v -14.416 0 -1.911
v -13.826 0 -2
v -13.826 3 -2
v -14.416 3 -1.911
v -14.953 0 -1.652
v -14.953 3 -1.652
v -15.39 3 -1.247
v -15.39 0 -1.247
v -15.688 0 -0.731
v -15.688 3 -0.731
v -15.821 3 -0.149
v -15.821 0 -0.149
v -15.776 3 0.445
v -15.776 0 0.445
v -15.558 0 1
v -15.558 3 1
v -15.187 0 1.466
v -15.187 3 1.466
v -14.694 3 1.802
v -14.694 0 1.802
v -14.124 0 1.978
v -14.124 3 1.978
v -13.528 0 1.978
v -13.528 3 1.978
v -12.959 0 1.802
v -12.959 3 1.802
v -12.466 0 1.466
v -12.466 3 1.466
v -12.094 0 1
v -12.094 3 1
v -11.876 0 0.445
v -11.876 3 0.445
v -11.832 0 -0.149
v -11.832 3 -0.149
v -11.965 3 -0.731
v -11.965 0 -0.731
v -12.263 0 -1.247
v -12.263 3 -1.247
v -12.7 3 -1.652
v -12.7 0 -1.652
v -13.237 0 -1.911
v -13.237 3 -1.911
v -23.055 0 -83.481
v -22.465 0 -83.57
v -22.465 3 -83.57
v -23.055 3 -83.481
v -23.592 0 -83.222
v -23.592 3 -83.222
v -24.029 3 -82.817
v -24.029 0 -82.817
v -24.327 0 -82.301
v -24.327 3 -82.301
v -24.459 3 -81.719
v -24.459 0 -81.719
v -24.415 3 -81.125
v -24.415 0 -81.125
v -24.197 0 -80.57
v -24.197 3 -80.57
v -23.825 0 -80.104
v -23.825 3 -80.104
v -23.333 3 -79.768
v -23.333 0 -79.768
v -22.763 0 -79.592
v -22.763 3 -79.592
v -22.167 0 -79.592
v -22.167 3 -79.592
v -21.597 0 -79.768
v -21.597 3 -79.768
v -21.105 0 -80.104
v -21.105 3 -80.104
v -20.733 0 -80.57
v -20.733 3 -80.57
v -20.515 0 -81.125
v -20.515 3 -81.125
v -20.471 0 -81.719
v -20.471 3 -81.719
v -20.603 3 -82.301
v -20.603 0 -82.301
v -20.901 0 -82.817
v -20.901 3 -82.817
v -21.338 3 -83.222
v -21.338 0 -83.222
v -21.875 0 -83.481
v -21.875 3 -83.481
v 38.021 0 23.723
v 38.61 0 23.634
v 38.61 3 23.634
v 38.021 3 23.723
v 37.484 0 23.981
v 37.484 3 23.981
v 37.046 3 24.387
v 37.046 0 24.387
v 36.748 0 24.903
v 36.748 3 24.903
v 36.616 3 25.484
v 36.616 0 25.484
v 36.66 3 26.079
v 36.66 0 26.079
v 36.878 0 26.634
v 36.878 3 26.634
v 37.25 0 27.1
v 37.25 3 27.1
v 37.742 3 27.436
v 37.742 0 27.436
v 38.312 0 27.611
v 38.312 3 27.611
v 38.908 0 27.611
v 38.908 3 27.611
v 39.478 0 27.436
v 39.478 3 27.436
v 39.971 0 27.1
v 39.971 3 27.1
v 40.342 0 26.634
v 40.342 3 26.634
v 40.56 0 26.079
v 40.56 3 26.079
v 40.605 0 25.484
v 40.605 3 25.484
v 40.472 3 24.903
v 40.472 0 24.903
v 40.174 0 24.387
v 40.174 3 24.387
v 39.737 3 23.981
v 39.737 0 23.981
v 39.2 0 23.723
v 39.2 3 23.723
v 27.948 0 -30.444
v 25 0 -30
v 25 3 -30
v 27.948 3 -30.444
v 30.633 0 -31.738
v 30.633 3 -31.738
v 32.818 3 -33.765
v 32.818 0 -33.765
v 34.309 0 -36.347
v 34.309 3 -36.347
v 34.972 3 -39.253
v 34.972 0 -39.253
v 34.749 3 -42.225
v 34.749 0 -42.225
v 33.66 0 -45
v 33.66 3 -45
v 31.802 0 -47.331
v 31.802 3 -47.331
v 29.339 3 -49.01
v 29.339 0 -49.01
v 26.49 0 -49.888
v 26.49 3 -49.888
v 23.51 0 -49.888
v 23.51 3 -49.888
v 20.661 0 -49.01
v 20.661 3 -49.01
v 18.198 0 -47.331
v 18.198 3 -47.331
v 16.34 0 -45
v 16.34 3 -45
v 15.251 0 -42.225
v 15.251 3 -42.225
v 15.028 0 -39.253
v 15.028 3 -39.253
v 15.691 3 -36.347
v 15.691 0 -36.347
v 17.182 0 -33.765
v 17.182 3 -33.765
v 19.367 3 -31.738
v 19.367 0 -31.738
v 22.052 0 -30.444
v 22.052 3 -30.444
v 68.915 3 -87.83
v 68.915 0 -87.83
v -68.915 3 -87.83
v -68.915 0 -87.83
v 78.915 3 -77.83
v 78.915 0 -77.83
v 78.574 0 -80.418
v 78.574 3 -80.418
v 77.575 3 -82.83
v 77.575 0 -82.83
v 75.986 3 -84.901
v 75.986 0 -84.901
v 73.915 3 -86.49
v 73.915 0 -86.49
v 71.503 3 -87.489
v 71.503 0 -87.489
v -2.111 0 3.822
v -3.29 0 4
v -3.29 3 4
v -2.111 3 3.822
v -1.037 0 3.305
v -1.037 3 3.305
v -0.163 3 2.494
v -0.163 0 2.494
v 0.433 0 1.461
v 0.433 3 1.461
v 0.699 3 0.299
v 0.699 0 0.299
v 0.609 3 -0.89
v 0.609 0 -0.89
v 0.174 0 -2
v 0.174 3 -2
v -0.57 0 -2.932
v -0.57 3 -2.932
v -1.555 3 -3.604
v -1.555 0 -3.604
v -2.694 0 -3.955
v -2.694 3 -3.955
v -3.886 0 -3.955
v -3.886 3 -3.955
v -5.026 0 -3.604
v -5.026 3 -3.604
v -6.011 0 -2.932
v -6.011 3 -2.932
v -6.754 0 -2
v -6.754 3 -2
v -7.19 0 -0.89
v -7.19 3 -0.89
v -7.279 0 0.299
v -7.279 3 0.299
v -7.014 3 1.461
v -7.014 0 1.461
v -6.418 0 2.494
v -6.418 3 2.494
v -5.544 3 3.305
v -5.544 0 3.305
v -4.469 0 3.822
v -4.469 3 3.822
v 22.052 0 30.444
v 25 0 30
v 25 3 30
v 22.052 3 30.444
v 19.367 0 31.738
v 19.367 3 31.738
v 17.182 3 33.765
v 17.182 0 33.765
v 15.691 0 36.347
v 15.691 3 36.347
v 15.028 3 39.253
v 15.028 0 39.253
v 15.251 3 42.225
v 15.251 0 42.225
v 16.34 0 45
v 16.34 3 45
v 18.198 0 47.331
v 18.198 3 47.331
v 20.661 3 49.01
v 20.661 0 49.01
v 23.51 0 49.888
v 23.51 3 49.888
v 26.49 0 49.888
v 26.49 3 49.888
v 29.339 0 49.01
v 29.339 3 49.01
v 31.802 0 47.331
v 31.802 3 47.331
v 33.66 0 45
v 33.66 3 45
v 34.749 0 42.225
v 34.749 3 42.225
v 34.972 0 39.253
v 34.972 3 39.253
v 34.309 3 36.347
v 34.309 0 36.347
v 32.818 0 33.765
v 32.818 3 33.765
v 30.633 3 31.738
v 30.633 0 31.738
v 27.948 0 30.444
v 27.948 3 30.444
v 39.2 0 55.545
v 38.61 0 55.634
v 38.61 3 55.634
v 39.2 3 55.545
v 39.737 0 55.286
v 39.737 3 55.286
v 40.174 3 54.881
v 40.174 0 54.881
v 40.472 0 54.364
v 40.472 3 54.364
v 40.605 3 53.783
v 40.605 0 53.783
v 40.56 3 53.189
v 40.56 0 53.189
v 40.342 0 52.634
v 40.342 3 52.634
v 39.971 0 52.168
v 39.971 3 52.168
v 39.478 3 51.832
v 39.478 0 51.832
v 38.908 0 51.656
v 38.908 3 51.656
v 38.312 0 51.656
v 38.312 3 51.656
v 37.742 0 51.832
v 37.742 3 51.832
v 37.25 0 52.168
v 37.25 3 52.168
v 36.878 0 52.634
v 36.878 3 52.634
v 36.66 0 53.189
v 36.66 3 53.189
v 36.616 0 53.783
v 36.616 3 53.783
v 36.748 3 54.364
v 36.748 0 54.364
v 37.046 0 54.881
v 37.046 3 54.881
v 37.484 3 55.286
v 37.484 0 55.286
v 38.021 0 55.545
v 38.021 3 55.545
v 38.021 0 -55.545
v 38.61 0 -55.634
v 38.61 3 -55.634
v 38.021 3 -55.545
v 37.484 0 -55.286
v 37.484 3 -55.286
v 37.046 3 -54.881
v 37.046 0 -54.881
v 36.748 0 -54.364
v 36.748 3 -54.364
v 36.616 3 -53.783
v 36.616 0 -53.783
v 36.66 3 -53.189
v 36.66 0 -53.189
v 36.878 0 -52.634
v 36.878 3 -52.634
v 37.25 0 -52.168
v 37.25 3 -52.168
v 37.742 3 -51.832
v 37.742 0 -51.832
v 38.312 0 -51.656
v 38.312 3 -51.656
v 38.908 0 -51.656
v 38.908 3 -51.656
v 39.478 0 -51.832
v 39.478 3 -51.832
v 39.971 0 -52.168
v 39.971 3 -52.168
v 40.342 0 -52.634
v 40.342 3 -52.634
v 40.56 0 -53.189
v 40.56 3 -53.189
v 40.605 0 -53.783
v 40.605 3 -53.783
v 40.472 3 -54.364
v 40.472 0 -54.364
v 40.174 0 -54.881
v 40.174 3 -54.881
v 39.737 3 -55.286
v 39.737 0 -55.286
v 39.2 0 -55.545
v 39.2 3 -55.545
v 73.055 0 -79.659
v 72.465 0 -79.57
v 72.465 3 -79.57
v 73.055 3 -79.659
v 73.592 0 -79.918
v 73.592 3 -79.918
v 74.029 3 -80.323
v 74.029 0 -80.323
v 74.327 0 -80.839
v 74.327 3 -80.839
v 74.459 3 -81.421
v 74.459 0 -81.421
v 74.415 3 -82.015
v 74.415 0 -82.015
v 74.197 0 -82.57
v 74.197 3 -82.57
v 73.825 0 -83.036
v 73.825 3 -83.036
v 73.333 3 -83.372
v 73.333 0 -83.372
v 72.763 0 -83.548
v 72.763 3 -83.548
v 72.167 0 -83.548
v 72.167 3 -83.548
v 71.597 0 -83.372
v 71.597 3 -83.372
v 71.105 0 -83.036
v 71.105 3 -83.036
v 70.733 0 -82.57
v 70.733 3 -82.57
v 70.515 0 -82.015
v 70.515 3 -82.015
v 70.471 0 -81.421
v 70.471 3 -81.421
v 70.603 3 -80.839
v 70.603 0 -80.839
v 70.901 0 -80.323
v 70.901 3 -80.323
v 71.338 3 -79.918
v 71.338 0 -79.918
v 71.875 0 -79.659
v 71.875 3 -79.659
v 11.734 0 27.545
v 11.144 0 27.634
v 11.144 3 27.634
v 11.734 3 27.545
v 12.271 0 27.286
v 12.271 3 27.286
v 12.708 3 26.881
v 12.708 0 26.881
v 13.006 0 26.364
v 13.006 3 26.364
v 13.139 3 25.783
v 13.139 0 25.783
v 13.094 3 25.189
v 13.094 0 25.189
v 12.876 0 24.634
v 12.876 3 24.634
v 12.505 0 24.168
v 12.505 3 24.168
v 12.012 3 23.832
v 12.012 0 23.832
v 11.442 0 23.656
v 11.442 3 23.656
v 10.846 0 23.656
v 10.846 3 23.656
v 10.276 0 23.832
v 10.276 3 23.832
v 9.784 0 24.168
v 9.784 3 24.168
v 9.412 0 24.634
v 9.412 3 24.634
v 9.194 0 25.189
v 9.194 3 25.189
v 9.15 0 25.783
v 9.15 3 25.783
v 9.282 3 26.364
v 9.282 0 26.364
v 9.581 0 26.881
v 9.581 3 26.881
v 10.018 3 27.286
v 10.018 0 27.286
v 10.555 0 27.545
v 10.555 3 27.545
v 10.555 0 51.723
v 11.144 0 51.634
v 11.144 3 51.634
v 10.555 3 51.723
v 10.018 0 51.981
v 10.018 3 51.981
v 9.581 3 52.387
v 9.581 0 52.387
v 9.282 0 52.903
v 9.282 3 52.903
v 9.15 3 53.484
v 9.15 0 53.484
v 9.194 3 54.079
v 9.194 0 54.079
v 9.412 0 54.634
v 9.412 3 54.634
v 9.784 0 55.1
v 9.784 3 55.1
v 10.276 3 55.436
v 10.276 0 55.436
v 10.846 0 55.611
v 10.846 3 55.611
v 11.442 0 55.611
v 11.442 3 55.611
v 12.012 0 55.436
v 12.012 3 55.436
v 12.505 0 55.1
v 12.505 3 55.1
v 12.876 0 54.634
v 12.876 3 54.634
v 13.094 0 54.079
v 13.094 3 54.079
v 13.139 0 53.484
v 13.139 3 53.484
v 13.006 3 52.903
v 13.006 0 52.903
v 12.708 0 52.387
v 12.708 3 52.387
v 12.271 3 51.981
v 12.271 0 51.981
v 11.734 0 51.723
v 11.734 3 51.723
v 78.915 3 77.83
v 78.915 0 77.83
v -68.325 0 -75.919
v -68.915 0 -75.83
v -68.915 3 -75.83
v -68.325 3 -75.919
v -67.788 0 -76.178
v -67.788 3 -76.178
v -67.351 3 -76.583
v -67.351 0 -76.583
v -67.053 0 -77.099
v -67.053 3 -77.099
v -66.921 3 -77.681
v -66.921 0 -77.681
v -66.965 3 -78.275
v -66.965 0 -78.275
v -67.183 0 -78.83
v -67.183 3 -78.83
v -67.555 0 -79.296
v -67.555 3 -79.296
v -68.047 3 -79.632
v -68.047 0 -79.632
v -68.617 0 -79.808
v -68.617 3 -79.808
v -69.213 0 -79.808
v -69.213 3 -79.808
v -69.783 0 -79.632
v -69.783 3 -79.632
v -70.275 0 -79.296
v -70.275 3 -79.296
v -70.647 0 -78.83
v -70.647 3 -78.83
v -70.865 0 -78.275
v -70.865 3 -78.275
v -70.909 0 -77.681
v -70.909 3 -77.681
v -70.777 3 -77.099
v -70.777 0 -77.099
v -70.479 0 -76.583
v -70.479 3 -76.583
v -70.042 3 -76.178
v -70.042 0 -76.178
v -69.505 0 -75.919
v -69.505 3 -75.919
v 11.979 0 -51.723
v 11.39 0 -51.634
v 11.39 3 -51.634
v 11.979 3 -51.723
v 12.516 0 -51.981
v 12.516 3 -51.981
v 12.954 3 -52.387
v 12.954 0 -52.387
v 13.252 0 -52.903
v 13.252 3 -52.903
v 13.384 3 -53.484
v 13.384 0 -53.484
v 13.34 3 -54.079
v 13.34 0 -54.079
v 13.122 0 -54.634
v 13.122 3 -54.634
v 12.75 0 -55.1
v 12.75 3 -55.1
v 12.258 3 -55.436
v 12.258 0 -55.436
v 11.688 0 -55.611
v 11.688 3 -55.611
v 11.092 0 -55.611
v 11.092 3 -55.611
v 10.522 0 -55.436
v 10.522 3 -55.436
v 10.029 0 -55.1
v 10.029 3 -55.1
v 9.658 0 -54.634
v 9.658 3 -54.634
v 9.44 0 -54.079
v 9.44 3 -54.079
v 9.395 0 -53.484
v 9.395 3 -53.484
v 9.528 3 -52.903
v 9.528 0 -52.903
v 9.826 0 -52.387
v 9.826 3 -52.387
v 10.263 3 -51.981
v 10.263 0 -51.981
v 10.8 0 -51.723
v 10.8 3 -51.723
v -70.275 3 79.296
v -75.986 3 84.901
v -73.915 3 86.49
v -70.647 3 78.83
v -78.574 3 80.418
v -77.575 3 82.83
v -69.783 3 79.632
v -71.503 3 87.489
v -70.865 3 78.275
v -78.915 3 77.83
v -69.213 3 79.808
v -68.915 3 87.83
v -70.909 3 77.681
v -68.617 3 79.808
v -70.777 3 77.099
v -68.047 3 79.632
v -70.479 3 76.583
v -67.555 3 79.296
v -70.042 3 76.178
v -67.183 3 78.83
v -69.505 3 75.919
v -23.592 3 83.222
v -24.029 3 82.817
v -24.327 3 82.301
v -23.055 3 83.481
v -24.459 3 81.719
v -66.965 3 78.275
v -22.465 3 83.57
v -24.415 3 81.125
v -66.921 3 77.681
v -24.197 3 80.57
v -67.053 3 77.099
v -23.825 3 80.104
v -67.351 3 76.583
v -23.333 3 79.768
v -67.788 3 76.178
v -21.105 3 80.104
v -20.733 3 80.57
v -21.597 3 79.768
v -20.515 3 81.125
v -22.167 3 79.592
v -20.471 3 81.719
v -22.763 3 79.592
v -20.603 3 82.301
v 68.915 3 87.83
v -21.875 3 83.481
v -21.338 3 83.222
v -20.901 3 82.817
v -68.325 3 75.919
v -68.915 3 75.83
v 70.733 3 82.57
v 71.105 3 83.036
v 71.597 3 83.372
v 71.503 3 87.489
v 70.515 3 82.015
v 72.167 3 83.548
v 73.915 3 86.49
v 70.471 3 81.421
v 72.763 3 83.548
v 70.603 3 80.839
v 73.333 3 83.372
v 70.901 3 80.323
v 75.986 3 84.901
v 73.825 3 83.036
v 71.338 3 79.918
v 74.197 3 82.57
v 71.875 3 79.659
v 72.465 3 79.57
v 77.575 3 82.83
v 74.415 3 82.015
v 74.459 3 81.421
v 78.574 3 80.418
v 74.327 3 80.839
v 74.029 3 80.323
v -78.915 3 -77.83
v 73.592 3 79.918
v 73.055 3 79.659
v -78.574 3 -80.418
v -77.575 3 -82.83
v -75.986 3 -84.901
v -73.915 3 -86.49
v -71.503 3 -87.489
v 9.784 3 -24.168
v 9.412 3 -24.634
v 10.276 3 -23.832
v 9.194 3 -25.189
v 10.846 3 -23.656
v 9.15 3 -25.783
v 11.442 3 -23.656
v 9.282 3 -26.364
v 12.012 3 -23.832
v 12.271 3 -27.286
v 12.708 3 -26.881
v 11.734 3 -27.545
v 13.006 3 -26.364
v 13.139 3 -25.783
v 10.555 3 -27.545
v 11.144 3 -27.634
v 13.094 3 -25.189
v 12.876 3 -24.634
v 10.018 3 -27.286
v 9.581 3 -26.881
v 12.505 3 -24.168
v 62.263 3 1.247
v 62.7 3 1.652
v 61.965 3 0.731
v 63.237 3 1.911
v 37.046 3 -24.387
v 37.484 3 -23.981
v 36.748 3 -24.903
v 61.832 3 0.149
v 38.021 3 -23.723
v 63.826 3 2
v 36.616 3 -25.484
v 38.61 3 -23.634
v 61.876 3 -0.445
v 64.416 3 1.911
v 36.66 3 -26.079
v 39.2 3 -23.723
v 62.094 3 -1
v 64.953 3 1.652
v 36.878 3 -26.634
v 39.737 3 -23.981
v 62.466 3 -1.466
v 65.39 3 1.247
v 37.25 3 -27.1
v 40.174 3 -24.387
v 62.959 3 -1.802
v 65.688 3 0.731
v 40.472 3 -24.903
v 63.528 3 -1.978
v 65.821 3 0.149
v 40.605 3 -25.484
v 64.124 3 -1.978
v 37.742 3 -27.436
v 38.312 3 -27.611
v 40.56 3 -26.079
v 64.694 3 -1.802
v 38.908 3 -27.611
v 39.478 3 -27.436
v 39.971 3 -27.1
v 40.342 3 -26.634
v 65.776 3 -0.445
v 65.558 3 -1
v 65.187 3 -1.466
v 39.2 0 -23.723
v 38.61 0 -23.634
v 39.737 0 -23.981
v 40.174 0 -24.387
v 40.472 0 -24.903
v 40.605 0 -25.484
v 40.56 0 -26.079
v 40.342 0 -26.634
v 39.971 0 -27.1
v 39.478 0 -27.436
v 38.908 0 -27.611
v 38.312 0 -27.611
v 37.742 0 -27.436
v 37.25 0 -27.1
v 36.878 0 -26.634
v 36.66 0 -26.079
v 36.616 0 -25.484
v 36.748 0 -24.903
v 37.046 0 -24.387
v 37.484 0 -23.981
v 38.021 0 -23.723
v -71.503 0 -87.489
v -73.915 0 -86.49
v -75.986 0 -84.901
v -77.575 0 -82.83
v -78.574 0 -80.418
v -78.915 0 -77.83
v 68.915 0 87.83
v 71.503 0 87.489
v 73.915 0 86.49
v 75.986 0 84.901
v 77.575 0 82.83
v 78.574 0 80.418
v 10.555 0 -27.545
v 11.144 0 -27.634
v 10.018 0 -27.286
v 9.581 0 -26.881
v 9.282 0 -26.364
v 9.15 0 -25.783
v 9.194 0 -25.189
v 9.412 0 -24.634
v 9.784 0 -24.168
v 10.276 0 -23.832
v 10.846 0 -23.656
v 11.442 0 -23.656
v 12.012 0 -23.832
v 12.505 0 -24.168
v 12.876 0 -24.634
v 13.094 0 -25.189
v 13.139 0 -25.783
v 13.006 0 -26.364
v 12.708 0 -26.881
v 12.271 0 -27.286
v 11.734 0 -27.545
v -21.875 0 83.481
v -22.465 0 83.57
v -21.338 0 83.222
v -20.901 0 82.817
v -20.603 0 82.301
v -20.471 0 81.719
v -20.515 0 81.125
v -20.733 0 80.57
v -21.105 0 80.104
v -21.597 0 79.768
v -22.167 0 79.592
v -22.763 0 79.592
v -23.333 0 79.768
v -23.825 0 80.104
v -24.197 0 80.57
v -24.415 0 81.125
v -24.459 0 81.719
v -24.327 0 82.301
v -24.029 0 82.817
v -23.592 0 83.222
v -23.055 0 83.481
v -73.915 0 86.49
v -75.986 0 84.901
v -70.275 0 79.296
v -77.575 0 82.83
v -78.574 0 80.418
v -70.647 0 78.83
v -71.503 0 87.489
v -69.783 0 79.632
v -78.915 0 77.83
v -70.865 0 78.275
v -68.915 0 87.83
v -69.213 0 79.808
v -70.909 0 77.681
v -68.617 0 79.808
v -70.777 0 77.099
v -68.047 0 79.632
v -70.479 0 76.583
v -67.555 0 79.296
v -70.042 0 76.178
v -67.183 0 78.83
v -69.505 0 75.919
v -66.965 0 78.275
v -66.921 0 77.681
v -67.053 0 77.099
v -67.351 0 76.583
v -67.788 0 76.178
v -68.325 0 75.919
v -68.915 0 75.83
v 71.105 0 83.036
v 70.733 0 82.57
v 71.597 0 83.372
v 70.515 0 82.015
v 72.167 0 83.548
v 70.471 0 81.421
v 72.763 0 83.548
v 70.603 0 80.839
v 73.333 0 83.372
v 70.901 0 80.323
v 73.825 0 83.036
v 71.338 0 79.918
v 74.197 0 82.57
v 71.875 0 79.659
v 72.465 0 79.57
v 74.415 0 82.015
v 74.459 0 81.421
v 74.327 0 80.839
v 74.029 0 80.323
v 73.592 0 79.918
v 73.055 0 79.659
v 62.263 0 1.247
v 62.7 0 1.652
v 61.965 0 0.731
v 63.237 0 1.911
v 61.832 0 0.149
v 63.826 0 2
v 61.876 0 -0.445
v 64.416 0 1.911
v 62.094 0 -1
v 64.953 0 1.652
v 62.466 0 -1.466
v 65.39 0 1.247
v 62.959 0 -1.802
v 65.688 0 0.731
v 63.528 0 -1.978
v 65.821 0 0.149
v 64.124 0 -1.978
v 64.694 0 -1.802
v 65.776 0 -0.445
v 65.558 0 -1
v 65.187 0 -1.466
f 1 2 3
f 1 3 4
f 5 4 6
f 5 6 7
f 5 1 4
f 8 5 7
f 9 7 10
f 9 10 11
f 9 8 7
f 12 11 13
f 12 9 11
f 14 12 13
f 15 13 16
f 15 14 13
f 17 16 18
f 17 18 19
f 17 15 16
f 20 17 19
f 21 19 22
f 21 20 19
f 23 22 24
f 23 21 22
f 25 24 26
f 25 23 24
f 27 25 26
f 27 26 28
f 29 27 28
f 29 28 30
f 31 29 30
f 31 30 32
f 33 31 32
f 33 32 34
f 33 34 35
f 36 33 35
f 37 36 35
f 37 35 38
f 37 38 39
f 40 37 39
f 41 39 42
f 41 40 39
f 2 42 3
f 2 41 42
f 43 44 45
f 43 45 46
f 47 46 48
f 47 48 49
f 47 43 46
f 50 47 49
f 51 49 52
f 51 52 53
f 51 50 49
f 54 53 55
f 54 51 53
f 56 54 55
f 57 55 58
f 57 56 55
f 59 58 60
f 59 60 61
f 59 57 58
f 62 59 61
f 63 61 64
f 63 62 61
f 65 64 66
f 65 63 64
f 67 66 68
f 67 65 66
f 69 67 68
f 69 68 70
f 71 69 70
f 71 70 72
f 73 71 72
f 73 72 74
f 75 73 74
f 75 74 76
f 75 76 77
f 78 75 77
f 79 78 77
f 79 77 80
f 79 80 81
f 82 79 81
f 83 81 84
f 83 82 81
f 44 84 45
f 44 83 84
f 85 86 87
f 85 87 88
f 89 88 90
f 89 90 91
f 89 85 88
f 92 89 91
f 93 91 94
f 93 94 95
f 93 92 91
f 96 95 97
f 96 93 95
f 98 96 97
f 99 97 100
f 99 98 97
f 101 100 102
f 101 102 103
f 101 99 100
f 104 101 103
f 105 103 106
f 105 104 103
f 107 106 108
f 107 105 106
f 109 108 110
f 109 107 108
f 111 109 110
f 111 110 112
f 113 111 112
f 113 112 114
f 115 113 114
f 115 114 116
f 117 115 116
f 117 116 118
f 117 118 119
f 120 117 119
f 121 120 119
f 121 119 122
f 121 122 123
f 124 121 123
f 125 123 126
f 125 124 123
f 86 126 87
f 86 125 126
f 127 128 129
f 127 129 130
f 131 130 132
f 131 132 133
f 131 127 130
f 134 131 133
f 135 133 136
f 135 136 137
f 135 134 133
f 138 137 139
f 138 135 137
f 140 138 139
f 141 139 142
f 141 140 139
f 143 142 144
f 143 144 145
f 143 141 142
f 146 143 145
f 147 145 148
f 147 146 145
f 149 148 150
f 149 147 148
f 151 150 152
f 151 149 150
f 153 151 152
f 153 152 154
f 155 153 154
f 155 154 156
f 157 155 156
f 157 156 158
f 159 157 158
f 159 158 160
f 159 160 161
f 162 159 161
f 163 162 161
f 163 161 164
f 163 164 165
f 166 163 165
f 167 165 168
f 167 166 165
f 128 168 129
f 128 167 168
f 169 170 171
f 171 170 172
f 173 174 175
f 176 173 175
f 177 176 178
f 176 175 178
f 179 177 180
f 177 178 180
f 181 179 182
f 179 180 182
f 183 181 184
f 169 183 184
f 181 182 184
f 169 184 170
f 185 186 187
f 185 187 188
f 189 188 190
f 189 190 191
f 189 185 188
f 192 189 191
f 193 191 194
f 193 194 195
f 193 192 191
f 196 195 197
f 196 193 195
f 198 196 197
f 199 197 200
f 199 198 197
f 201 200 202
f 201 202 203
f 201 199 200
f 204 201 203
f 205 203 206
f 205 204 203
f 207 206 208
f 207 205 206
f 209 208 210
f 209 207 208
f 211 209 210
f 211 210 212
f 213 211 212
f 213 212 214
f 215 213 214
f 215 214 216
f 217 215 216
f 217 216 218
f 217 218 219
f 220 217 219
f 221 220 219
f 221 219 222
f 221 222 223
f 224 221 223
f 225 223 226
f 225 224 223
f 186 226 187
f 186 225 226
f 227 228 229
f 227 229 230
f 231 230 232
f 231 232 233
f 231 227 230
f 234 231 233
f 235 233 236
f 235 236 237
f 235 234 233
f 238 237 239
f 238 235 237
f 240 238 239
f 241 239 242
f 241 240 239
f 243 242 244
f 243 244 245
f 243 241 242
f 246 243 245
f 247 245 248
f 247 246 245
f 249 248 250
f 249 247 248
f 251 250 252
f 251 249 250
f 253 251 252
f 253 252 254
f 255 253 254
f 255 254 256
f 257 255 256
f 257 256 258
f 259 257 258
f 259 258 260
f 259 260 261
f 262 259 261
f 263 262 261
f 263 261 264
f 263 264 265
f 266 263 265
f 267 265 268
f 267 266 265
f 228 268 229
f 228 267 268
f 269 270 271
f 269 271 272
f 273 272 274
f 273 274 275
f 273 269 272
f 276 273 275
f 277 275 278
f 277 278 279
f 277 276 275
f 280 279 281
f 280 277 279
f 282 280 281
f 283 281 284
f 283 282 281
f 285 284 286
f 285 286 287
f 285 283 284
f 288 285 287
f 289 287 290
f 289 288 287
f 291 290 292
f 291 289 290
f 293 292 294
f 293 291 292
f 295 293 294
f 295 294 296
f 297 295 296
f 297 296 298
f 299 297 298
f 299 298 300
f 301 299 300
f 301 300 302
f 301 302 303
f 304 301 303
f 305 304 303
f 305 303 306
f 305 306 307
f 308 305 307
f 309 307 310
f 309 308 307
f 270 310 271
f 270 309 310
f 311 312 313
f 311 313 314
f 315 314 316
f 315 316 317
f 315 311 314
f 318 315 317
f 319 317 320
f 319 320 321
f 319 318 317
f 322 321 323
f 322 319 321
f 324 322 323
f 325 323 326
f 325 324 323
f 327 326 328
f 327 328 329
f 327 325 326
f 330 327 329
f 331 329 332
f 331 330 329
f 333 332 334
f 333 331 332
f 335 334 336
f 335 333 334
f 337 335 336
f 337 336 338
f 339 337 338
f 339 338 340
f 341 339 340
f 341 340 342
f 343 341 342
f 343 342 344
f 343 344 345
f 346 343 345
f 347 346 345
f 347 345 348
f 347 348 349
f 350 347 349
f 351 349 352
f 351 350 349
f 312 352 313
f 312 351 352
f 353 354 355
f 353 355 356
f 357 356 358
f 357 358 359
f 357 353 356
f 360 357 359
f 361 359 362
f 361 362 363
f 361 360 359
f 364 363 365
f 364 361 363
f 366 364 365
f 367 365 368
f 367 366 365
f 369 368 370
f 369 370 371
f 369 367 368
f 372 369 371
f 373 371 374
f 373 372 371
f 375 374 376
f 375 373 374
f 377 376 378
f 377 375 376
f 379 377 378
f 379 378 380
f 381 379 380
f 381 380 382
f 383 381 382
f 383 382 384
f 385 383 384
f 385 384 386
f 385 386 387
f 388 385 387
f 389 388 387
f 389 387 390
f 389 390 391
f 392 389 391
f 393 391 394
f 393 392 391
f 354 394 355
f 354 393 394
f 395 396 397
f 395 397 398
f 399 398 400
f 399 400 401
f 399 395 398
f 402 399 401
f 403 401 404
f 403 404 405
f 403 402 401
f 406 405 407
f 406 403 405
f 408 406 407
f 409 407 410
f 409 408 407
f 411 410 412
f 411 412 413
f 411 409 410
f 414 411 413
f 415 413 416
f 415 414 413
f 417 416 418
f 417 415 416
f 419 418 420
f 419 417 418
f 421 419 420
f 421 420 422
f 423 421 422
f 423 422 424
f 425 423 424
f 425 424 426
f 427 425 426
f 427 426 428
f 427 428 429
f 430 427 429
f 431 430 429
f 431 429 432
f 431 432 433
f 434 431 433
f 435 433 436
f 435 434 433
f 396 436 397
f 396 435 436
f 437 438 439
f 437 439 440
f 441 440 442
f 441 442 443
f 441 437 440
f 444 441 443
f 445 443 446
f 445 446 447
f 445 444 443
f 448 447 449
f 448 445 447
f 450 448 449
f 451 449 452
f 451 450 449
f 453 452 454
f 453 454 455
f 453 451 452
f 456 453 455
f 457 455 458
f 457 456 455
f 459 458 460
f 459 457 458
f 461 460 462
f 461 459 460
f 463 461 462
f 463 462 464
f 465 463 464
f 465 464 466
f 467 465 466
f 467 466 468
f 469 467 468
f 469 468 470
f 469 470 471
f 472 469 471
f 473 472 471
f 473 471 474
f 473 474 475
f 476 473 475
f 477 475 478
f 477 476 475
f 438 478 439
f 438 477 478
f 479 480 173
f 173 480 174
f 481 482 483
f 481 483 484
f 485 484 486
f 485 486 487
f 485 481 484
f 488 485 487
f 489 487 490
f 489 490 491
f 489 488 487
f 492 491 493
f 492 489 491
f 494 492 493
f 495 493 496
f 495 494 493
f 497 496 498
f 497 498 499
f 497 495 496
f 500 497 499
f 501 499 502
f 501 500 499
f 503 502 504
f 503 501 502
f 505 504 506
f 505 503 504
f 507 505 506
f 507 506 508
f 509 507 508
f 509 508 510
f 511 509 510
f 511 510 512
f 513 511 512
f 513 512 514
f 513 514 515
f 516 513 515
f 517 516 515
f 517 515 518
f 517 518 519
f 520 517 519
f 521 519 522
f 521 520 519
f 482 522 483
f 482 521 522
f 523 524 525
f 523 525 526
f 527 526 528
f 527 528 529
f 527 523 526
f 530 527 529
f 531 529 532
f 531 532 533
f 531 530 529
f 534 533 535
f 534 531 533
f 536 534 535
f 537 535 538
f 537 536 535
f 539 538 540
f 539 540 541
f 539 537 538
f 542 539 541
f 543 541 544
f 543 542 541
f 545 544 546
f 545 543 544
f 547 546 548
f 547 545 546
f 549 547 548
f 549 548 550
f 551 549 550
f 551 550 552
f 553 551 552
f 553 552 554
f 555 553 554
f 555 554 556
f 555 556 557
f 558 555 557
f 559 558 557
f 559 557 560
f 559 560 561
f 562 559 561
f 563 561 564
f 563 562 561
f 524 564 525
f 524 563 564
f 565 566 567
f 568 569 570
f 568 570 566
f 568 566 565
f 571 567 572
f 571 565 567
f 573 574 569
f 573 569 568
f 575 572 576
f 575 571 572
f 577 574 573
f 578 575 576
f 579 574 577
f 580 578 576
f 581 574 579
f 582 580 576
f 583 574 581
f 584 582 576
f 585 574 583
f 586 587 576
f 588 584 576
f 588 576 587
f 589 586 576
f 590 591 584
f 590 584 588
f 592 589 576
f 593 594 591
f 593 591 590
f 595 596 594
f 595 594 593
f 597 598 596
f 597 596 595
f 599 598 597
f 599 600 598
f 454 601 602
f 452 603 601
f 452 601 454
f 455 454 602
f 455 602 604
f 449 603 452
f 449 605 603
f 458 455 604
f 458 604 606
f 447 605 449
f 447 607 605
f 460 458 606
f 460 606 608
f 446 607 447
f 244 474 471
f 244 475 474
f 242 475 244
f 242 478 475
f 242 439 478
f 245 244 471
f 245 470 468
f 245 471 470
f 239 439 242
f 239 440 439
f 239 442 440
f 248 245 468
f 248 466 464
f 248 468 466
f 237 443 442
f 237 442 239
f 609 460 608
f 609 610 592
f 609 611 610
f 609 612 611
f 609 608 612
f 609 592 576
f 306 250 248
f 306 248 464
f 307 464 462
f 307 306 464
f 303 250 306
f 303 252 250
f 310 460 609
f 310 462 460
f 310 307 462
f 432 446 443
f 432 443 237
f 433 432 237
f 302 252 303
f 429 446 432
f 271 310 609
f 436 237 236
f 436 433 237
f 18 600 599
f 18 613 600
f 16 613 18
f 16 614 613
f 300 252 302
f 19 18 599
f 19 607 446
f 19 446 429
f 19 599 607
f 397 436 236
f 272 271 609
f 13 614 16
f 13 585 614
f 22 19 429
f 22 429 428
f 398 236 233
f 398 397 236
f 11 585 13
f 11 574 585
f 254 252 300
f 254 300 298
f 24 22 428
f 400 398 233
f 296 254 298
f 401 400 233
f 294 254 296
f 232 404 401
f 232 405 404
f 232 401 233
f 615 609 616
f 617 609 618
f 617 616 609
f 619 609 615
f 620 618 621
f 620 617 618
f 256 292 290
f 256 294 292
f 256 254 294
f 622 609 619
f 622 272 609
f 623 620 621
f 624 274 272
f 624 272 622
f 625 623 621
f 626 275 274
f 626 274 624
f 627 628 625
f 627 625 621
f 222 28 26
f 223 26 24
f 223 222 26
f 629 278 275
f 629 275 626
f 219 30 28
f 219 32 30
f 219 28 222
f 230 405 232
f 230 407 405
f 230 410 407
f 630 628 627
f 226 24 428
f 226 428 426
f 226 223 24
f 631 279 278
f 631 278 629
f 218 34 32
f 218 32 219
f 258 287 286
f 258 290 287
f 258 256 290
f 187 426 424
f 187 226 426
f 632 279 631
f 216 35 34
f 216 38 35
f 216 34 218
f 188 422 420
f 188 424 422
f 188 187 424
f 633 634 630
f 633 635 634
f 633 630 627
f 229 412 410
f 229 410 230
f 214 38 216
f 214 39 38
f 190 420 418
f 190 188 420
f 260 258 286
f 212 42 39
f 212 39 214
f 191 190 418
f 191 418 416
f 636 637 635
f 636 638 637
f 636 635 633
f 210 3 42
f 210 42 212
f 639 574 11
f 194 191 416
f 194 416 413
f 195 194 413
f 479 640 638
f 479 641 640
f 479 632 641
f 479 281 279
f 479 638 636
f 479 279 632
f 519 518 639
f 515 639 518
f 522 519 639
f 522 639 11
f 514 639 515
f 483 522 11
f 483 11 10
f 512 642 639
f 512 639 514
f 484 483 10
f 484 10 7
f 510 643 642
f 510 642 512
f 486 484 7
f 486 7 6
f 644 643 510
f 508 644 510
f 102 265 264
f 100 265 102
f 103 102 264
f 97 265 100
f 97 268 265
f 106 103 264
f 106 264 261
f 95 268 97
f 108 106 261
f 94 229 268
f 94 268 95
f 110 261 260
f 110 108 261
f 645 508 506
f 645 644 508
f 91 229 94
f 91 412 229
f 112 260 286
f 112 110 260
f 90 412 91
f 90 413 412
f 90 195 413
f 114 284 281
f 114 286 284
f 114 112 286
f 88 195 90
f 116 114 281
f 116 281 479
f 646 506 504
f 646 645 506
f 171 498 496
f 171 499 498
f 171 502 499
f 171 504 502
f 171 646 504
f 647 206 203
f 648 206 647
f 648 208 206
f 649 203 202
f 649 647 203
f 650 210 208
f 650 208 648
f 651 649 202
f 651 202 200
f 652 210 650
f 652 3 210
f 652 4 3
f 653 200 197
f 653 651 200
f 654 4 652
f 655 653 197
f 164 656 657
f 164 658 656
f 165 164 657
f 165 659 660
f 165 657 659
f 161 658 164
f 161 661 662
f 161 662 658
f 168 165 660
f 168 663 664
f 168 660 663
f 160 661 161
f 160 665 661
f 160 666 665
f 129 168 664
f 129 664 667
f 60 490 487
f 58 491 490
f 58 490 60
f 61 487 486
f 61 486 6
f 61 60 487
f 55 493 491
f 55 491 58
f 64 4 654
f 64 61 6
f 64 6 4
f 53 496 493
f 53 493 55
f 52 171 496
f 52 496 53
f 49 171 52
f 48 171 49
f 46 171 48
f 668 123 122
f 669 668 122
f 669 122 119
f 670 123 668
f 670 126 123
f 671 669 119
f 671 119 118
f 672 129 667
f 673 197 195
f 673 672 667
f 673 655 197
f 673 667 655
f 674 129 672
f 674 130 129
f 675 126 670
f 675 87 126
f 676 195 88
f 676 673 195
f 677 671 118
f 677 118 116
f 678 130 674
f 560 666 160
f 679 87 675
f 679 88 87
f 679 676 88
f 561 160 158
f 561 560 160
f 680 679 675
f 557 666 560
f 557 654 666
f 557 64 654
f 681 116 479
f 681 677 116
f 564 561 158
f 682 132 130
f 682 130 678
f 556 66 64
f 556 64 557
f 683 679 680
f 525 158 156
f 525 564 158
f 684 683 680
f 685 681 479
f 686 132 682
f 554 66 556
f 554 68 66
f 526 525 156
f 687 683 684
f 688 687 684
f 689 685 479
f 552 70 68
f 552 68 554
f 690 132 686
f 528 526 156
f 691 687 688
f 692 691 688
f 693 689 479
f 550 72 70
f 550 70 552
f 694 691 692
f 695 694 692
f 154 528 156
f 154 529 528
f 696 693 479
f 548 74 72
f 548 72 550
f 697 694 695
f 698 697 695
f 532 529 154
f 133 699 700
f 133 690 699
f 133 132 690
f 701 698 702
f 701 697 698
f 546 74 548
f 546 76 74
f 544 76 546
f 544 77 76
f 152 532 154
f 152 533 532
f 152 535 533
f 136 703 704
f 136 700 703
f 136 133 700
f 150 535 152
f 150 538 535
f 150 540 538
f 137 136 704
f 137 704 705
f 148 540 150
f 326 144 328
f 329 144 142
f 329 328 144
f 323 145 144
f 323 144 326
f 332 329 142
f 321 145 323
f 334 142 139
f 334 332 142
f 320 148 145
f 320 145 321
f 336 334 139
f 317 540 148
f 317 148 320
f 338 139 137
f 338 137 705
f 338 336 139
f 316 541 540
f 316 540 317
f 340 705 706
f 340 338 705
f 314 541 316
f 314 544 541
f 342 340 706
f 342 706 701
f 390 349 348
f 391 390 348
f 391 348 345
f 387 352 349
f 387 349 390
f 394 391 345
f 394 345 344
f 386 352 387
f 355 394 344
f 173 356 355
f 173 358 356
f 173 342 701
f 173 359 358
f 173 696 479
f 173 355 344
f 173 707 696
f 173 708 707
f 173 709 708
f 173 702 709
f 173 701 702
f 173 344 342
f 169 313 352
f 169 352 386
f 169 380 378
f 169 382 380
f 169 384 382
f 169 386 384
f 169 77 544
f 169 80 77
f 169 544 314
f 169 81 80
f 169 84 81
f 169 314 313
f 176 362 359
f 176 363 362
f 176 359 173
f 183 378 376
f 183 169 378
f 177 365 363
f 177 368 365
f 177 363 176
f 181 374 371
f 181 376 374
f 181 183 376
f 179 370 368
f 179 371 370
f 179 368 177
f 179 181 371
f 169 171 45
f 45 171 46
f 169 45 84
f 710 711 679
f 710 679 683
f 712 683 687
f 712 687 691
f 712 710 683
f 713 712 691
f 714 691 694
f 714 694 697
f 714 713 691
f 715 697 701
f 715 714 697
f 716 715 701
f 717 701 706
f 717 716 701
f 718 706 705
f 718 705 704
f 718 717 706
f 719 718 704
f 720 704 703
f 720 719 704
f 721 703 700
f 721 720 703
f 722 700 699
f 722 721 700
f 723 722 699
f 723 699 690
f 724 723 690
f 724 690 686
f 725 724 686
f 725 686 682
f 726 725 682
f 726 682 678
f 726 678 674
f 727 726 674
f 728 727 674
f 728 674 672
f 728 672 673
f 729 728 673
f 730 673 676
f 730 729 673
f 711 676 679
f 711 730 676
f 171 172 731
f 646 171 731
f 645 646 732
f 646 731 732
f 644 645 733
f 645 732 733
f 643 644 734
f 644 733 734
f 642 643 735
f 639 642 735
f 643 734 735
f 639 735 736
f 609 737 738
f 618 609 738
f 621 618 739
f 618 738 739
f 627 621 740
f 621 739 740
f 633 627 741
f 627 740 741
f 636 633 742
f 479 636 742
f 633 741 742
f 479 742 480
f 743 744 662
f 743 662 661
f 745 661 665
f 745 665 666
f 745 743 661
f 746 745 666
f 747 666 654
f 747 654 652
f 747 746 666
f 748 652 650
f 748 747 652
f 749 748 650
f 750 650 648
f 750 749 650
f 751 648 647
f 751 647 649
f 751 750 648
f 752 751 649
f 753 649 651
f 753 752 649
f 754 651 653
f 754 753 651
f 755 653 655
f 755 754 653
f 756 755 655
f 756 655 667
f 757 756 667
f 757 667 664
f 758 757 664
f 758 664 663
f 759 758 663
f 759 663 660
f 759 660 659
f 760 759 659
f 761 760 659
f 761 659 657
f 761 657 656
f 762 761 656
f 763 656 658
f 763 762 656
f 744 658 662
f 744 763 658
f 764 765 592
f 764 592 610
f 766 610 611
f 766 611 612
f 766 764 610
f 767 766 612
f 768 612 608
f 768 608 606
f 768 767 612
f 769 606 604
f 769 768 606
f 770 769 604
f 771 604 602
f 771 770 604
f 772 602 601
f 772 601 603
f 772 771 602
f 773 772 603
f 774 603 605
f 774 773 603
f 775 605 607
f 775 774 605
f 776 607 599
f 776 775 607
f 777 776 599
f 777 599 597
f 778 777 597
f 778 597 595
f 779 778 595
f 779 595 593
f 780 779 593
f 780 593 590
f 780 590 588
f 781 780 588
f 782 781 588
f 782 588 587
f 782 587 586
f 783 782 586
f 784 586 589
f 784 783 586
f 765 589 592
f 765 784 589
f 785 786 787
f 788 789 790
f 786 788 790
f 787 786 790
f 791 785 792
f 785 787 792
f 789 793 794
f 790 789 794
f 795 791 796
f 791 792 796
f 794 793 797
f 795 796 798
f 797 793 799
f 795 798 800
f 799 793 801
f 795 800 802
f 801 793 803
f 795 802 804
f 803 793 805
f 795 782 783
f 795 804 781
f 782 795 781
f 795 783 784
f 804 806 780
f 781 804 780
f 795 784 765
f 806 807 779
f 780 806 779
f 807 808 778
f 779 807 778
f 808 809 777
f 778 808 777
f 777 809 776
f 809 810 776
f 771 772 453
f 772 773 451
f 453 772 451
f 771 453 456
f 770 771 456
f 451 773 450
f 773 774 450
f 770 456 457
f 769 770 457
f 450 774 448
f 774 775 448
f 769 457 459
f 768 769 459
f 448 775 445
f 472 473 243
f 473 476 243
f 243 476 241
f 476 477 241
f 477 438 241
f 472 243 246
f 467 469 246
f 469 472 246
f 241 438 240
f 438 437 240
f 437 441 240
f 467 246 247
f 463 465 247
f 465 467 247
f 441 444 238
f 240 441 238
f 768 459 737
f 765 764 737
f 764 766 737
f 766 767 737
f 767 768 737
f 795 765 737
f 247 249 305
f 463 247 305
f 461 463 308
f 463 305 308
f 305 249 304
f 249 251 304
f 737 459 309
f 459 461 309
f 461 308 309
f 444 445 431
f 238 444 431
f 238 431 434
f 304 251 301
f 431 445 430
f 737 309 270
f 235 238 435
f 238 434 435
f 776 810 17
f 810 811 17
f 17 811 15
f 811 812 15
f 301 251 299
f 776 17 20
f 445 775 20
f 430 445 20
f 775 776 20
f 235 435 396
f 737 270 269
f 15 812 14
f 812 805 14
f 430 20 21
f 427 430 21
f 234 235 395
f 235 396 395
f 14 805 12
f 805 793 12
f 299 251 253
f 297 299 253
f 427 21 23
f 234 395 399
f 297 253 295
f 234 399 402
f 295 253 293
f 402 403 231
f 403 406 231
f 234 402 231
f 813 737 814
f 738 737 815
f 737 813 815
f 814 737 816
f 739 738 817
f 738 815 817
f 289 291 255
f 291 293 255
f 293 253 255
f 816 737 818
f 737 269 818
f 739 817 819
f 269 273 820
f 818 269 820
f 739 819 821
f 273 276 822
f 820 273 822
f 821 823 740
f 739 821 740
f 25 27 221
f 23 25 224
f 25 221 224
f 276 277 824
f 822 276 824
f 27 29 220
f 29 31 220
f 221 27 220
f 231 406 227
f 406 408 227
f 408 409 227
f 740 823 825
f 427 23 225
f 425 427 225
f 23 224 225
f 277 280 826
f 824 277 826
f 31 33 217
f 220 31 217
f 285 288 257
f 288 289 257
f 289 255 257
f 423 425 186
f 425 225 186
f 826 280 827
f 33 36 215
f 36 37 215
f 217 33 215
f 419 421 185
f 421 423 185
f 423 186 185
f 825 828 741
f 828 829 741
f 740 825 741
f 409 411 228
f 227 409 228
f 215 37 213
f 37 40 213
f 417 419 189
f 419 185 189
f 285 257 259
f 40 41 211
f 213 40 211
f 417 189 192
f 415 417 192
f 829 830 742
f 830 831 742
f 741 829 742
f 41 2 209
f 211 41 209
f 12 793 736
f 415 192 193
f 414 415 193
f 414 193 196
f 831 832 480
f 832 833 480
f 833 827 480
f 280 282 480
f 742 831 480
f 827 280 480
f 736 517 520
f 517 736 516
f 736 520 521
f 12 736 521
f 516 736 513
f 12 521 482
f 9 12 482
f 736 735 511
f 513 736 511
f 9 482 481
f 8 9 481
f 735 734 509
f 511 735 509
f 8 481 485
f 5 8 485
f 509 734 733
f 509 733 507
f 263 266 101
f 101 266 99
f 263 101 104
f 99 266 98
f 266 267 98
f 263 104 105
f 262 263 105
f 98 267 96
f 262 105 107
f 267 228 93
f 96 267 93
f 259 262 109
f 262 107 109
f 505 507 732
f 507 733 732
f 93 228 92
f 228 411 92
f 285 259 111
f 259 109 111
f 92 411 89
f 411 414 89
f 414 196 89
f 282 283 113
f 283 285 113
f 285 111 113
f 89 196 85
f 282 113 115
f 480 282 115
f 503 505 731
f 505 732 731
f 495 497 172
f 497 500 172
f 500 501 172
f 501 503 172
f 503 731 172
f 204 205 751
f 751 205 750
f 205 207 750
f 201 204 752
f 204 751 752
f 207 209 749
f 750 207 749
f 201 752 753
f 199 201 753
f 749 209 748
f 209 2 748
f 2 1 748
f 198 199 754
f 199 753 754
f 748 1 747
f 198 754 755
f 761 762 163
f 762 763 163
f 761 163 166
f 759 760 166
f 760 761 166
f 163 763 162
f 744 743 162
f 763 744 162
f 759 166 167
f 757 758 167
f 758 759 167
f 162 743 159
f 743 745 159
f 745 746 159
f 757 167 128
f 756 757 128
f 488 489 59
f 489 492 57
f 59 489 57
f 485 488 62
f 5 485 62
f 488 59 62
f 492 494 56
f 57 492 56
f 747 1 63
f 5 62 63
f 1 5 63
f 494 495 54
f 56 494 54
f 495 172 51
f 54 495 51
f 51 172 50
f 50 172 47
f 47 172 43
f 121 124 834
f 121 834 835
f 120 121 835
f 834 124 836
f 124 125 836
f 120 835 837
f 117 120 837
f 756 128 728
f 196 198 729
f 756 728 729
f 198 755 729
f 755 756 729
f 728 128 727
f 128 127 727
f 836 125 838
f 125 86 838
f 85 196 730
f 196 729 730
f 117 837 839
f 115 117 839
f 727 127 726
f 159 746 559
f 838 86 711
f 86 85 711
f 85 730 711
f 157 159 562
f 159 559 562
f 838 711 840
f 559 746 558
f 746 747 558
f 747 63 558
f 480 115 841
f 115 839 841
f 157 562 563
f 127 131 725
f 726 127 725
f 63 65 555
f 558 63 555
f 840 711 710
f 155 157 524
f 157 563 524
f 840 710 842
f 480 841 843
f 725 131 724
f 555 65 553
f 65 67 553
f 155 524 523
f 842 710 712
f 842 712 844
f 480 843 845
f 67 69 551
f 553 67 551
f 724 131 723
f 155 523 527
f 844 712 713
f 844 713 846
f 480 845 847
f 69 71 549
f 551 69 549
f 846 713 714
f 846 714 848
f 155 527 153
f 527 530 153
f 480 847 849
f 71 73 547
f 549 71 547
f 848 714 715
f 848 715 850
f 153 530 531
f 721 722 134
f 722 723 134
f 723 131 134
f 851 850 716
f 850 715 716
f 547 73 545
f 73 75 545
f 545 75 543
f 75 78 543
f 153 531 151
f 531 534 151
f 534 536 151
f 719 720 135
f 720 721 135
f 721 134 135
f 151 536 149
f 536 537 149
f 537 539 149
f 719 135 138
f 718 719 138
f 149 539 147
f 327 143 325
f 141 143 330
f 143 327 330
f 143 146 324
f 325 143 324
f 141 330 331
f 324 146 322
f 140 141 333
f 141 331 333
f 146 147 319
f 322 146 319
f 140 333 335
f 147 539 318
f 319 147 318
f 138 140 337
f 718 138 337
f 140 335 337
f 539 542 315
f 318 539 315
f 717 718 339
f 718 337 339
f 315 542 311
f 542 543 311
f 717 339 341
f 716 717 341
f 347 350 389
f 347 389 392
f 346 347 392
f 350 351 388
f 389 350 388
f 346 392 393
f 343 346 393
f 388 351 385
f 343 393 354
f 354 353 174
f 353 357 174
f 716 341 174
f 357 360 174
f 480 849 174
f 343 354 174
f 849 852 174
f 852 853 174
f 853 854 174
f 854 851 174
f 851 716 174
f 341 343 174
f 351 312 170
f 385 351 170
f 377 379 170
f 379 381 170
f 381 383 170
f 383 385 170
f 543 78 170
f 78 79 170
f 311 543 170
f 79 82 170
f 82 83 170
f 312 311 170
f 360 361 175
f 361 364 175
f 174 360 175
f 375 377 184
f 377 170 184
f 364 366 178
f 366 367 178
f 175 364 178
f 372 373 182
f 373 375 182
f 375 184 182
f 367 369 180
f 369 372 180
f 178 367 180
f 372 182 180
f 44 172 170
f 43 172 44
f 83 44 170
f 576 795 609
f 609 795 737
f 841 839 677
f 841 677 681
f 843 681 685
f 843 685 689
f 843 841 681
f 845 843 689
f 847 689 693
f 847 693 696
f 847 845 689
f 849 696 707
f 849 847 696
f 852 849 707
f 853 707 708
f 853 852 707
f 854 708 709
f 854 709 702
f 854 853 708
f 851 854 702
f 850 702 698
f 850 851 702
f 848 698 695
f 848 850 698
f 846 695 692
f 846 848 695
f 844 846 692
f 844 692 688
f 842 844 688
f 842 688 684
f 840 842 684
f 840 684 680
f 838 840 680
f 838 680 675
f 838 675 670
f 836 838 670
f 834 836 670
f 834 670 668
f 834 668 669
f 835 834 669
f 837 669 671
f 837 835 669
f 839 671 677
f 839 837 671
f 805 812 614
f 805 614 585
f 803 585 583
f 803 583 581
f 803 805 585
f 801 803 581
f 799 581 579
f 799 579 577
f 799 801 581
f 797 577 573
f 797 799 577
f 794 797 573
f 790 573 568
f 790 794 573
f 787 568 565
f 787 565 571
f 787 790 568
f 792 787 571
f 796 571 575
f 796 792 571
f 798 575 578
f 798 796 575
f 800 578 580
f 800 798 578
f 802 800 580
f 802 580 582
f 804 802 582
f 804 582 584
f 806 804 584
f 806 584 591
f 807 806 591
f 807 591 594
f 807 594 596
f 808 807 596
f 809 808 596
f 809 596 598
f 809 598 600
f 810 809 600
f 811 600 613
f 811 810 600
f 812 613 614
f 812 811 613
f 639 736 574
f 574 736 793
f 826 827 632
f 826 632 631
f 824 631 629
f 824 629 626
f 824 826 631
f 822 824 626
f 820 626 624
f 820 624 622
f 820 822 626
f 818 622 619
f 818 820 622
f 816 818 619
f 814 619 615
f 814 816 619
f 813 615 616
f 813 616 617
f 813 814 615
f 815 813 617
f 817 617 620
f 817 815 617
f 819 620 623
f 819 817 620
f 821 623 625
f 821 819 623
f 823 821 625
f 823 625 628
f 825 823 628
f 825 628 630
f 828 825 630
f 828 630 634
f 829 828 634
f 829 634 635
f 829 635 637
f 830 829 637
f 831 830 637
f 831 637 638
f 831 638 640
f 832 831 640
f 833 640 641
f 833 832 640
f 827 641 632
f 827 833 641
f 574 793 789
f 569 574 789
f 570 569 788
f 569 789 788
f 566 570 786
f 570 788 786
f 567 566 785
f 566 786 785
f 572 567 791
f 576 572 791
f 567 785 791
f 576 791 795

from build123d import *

# Parameters (mm, degrees)
SKETCH_1_R      = 2
SKETCH_1_R_2    = 10
SKETCH_1_R_3    = 4
EXTRUDE_1_DEPTH = 3


with BuildPart() as part:
    # 草图1 → 凸台-拉伸1 (new body)
    with BuildSketch(Plane(origin=(0, 0, 0), x_dir=(1, 0, 0), z_dir=(0, 1, 0))):
        with BuildLine():
            Line((-78.915, 77.83), (-78.915, -77.83))
            ThreePointArc((-78.915, -77.83), (-75.986067812, -84.901067812), (-68.915, -87.83))
            Line((-68.915, -87.83), (68.915, -87.83))
            ThreePointArc((68.915, -87.83), (75.986067812, -84.901067812), (78.915, -77.83))
            Line((78.915, -77.83), (78.915, 77.83))
            ThreePointArc((78.915, 77.83), (75.986067812, 84.901067812), (68.915, 87.83))
            Line((68.915, 87.83), (-68.915, 87.83))
            ThreePointArc((-68.915, 87.83), (-75.986067812, 84.901067812), (-78.915, 77.83))
        make_face()
        with Locations(Location((72.465, 81.57, 0), (0, 0, 270))):
            Circle(SKETCH_1_R, mode=Mode.SUBTRACT)
        with Locations(Location((72.465, -81.57, 0), (0, 0, 90))):
            Circle(SKETCH_1_R, mode=Mode.SUBTRACT)
        with Locations(Location((-22.465, -81.57, 0), (0, 0, 270))):
            Circle(SKETCH_1_R, mode=Mode.SUBTRACT)
        with Locations(Location((-22.465, 81.57, 0), (0, 0, 90))):
            Circle(SKETCH_1_R, mode=Mode.SUBTRACT)
        with Locations(Location((-68.915, 77.83, 0), (0, 0, 270))):
            Circle(SKETCH_1_R, mode=Mode.SUBTRACT)
        with Locations(Location((-68.915, -77.83, 0), (0, 0, 90))):
            Circle(SKETCH_1_R, mode=Mode.SUBTRACT)
        with Locations(Location((25, 40, 0), (0, 0, 270))):
            Circle(SKETCH_1_R_2, mode=Mode.SUBTRACT)
        with Locations(Location((38.610158608, 53.633692132, 0), (0, 0, 90))):
            Circle(SKETCH_1_R, mode=Mode.SUBTRACT)
        with Locations(Location((38.610158608, 25.633692132, 0), (0, 0, 270))):
            Circle(SKETCH_1_R, mode=Mode.SUBTRACT)
        with Locations(Location((11.144228788, 25.633692132, 0), (0, 0, 90))):
            Circle(SKETCH_1_R, mode=Mode.SUBTRACT)
        with Locations(Location((25, -40, 0), (0, 0, 90))):
            Circle(SKETCH_1_R_2, mode=Mode.SUBTRACT)
        with Locations(Location((11.144228788, -25.633692132, 0), (0, 0, 270))):
            Circle(SKETCH_1_R, mode=Mode.SUBTRACT)
        with Locations(Location((38.610158608, -25.633692132, 0), (0, 0, 90))):
            Circle(SKETCH_1_R, mode=Mode.SUBTRACT)
        with Locations(Location((38.610158608, -53.633692132, 0), (0, 0, 270))):
            Circle(SKETCH_1_R, mode=Mode.SUBTRACT)
        with Locations(Location((11.144228788, -53.633692132, 0), (0, 0, 90))):
            Circle(SKETCH_1_R, mode=Mode.SUBTRACT)
        with Locations(Location((11.389841392, 53.633692132, 0), (0, 0, 270))):
            Circle(SKETCH_1_R, mode=Mode.SUBTRACT)
        with Locations(Location((63.82629955, 0, 0), (0, 0, 270))):
            Circle(SKETCH_1_R, mode=Mode.SUBTRACT)
        with Locations(Location((-13.82629955, 0, 0), (0, 0, 90))):
            Circle(SKETCH_1_R, mode=Mode.SUBTRACT)
        with Locations(Location((-3.290231438, 0, 0), (0, 0, 270))):
            Circle(SKETCH_1_R_3, mode=Mode.SUBTRACT)
    extrude(amount=EXTRUDE_1_DEPTH)


solid = part.part
